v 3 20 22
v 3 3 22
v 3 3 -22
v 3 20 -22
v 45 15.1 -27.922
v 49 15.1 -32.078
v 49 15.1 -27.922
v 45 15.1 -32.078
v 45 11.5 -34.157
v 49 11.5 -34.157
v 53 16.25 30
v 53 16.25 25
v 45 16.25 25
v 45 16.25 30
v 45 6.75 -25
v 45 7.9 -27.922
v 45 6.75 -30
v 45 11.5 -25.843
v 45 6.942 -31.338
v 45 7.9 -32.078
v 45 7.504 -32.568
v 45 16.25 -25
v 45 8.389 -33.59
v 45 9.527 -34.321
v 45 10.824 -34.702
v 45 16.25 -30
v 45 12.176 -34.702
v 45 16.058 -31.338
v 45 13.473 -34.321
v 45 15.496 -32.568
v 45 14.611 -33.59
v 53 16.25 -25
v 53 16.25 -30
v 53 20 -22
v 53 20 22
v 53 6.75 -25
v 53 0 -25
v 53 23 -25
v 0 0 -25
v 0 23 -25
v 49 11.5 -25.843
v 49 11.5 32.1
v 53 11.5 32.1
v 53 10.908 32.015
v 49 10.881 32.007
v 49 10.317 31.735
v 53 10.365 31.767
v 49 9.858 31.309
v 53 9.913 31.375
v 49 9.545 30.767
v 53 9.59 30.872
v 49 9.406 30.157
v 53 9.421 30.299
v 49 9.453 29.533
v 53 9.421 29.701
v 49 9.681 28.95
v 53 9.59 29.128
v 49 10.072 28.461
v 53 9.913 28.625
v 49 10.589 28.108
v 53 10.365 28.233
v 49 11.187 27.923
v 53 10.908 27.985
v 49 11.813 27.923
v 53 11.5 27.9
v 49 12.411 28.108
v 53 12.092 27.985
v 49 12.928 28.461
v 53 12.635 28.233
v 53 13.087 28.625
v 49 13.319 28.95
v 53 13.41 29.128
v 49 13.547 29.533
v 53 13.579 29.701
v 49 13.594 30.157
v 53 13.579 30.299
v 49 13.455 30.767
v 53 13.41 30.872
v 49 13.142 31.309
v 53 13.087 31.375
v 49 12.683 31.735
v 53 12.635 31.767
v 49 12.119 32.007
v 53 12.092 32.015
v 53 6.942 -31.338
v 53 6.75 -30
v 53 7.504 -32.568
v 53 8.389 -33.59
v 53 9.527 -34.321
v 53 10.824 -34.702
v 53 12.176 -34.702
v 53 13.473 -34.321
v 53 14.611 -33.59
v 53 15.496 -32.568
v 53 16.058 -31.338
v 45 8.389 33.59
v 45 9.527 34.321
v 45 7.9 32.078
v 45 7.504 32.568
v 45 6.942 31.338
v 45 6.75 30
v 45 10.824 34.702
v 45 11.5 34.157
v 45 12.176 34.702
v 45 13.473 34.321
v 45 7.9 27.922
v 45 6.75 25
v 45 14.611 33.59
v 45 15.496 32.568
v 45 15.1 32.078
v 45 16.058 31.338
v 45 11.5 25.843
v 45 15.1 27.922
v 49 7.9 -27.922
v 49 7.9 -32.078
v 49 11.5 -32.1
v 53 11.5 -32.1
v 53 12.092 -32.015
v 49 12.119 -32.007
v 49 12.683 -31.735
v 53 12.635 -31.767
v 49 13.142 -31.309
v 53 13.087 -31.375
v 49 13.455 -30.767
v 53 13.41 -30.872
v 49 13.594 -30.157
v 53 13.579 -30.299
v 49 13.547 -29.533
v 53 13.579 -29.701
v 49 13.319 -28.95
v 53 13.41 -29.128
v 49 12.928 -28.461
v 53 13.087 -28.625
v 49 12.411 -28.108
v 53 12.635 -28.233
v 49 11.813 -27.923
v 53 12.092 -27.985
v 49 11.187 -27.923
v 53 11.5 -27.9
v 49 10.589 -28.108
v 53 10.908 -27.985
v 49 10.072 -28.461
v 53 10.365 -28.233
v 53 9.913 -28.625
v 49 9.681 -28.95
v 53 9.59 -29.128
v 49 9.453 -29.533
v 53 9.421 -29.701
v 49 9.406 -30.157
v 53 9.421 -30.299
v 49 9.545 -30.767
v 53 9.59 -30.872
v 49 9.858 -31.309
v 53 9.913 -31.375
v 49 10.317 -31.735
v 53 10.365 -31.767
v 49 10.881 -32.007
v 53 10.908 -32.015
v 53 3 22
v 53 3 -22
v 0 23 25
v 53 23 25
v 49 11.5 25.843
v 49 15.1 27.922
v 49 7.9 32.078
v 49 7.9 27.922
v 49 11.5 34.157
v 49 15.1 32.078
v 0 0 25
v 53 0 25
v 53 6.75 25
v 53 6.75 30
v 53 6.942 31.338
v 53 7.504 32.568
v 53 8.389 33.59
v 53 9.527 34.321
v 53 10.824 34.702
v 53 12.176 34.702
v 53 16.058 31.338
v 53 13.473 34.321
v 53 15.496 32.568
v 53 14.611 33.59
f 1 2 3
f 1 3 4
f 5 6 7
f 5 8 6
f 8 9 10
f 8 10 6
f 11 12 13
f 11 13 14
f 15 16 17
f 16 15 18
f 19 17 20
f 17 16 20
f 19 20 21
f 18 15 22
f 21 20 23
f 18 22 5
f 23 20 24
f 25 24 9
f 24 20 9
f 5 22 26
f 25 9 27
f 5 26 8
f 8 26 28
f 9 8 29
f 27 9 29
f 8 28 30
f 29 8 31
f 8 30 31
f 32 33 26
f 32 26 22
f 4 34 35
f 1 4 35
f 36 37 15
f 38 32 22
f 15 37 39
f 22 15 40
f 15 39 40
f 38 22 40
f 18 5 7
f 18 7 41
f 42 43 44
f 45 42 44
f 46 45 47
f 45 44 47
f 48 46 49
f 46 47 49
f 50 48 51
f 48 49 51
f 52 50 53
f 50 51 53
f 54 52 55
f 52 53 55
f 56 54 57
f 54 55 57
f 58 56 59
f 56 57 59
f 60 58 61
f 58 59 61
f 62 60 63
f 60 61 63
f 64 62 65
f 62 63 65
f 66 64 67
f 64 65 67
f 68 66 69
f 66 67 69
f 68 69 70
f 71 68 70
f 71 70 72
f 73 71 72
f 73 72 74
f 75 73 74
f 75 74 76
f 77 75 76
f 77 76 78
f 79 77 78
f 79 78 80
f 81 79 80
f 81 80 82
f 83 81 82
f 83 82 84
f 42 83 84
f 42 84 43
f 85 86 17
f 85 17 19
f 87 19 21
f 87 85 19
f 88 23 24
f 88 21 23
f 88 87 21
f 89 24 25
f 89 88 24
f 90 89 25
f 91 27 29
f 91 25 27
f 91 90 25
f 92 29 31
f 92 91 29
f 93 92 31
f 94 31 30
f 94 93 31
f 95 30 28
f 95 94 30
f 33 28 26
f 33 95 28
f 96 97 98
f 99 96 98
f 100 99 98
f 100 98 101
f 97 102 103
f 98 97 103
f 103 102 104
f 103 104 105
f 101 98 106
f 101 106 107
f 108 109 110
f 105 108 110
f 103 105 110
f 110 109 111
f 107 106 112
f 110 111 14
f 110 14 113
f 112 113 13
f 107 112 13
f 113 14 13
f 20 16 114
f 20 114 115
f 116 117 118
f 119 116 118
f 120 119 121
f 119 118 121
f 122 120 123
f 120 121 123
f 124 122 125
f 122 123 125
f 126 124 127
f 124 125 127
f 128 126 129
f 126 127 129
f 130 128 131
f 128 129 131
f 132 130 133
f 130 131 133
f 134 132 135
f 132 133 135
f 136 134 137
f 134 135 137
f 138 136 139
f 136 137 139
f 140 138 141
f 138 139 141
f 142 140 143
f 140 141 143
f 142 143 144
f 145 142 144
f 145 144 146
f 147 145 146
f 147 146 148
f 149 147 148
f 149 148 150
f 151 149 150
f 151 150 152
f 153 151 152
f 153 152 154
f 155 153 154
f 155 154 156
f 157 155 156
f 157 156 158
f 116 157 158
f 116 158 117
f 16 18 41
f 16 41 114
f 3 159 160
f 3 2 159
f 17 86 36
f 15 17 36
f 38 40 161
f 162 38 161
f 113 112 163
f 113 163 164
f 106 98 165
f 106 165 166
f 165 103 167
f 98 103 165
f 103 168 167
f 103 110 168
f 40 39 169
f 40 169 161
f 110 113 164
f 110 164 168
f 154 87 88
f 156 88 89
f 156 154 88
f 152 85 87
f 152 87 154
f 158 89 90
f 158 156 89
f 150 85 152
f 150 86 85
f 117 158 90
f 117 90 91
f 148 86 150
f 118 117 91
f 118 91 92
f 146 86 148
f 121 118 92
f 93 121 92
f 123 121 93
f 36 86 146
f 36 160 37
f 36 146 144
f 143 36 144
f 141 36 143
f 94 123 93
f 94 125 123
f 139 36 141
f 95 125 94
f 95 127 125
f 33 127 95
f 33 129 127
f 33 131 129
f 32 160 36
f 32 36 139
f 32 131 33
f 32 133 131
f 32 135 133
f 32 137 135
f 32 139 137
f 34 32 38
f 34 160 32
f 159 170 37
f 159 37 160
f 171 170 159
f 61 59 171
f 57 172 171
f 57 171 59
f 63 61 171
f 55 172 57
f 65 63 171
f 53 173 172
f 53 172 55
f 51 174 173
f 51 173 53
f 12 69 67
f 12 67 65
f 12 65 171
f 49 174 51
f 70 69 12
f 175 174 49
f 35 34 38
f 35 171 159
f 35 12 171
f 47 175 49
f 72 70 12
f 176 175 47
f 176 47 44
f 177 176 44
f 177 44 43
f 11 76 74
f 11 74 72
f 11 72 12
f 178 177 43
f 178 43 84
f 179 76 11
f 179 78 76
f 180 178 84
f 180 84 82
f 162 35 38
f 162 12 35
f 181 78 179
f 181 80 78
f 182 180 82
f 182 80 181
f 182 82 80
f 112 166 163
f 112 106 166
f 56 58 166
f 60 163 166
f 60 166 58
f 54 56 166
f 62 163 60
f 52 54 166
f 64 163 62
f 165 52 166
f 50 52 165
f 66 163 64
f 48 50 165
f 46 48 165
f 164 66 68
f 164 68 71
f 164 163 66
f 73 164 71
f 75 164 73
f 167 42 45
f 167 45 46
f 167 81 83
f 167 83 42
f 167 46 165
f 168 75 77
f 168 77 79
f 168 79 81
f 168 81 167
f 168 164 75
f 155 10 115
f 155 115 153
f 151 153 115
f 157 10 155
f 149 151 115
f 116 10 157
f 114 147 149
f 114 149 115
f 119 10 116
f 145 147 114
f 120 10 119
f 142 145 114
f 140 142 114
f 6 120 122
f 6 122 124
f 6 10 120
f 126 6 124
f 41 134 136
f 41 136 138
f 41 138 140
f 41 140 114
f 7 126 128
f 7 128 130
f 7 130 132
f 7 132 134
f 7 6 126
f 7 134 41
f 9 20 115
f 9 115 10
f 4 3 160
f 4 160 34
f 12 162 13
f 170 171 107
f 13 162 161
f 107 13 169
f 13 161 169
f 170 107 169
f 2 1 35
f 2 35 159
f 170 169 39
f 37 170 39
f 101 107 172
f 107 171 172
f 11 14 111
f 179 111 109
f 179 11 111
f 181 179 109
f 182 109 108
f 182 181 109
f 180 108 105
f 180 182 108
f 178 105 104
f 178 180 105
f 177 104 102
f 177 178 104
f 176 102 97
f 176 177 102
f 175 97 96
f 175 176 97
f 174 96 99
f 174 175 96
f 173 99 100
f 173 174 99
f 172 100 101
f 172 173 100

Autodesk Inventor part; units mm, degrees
ref_plane "YZ Plane" through (0, 0, 0) normal (1, 0, 0) x (0, 1, 0)
ref_plane "XZ Plane" through (0, 0, 0) normal (0, 1, 0) x (-1, 0, 0)
sketch "Sketch2" plane through (0, 0, 0) normal (1, 0, 0) x (0, 1, 0)
  line L0 (23, 25) -> (0, 25)
  line L1 (0, 25) -> (0, -25)
  line L2 (0, -25) -> (23, -25)
  line L3 (23, -25) -> (23, 25)
  line L4 (20, 22) -> (3, 22)
  line L5 (3, 22) -> (3, -22)
  line L6 (3, -22) -> (20, -22)
  line L7 (20, -22) -> (20, 22)
  line L8 (0, -35) -> (0, 35) projected
  line L9 (-4.6, 0) -> (27.6, 0) projected
  point P0 (0, 0)
  dimension "d8" = 50
  dimension "d9" = 23
  dimension "d10" = 3
  dimension "d11" = 3
  dimension "d12" = 3
  dimension "d13" = 17
extrude "Extrusion3" add sketch "Sketch2" along normal blind 3
extrude "Extrusion4" add sketch "Sketch2" along normal blind 53 contours L3 L9 L7 L4 L5 L1 L0 | L3 L2 L1 L9 L5 L6 L7
sketch "Sketch5" plane through (53, 0, 0) normal (1, 0, 0) x (0, 0, -1)
  line L0 (25, 0) -> (25, 23) projected
  line L1 (25, 23) -> (-25, 23) projected
  line L2 (-25, 23) -> (-25, 0) projected
  line L3 (-25, 0) -> (25, 0) projected
  line L4 (22, 3) -> (-22, 3) projected
  line L5 (-22, 3) -> (-22, 20) projected
  line L6 (-22, 20) -> (22, 20) projected
  line L7 (22, 20) -> (22, 3) projected
  line L8 (22, 11.5) -> (30, 11.5)
  line L9 (25, 0) -> (25, 23) projected
  circle A0 centre (30, 11.5) radius 4.75
  line L10 (30, 6.75) -> (25, 6.75)
  line L11 (30, 16.25) -> (25, 16.25)
  circle A1 centre (30, 11.5) radius 2.1
  point P0 (0, 0)
  point P1 (25, 6.75)
  dimension "d32" = 9.5
  dimension "d33" = 5
  dimension "d39" = 4.2
extrude "Extrusion7" add sketch "Sketch5" against normal blind 8 contours L0 L8 A0 L10 | L0 L11 A0 L8 | A0
sketch "Sketch6" plane through (45, 0, 0) normal (-1, 0, 0) x (0, 0, 1)
  line L0 (-30, 6.75) -> (-25, 6.75) projected
  line L1 (-25, 16.25) -> (-25, 6.75) projected
  line L2 (-25, 16.25) -> (-30, 16.25) projected
  arc A0 (-30, 16.25) -> (-30, 6.75) centre (-30, 11.5) ccw projected
  line L3 (-25.8431, 11.5) -> (-27.9215, 7.9)
  line L4 (-27.9215, 7.9) -> (-32.0785, 7.9)
  line L5 (-32.0785, 7.9) -> (-34.1569, 11.5)
  line L6 (-34.1569, 11.5) -> (-32.0785, 15.1)
  line L7 (-32.0785, 15.1) -> (-27.9215, 15.1)
  line L8 (-27.9215, 15.1) -> (-25.8431, 11.5)
  point P0 (0, 0)
  dimension "d36" = 7.2
extrude "Extrusion8" cut sketch "Sketch6" against normal blind 4 contours L3 L4 L5 L6 L7 L8
mirror "Mirror1" about plane through (0, 0, 0) normal (0, 0, 1) of "Extrusion7", "Extrusion8"
equation "\"d12\" = d11"
properties part number "pudelko_baza"
